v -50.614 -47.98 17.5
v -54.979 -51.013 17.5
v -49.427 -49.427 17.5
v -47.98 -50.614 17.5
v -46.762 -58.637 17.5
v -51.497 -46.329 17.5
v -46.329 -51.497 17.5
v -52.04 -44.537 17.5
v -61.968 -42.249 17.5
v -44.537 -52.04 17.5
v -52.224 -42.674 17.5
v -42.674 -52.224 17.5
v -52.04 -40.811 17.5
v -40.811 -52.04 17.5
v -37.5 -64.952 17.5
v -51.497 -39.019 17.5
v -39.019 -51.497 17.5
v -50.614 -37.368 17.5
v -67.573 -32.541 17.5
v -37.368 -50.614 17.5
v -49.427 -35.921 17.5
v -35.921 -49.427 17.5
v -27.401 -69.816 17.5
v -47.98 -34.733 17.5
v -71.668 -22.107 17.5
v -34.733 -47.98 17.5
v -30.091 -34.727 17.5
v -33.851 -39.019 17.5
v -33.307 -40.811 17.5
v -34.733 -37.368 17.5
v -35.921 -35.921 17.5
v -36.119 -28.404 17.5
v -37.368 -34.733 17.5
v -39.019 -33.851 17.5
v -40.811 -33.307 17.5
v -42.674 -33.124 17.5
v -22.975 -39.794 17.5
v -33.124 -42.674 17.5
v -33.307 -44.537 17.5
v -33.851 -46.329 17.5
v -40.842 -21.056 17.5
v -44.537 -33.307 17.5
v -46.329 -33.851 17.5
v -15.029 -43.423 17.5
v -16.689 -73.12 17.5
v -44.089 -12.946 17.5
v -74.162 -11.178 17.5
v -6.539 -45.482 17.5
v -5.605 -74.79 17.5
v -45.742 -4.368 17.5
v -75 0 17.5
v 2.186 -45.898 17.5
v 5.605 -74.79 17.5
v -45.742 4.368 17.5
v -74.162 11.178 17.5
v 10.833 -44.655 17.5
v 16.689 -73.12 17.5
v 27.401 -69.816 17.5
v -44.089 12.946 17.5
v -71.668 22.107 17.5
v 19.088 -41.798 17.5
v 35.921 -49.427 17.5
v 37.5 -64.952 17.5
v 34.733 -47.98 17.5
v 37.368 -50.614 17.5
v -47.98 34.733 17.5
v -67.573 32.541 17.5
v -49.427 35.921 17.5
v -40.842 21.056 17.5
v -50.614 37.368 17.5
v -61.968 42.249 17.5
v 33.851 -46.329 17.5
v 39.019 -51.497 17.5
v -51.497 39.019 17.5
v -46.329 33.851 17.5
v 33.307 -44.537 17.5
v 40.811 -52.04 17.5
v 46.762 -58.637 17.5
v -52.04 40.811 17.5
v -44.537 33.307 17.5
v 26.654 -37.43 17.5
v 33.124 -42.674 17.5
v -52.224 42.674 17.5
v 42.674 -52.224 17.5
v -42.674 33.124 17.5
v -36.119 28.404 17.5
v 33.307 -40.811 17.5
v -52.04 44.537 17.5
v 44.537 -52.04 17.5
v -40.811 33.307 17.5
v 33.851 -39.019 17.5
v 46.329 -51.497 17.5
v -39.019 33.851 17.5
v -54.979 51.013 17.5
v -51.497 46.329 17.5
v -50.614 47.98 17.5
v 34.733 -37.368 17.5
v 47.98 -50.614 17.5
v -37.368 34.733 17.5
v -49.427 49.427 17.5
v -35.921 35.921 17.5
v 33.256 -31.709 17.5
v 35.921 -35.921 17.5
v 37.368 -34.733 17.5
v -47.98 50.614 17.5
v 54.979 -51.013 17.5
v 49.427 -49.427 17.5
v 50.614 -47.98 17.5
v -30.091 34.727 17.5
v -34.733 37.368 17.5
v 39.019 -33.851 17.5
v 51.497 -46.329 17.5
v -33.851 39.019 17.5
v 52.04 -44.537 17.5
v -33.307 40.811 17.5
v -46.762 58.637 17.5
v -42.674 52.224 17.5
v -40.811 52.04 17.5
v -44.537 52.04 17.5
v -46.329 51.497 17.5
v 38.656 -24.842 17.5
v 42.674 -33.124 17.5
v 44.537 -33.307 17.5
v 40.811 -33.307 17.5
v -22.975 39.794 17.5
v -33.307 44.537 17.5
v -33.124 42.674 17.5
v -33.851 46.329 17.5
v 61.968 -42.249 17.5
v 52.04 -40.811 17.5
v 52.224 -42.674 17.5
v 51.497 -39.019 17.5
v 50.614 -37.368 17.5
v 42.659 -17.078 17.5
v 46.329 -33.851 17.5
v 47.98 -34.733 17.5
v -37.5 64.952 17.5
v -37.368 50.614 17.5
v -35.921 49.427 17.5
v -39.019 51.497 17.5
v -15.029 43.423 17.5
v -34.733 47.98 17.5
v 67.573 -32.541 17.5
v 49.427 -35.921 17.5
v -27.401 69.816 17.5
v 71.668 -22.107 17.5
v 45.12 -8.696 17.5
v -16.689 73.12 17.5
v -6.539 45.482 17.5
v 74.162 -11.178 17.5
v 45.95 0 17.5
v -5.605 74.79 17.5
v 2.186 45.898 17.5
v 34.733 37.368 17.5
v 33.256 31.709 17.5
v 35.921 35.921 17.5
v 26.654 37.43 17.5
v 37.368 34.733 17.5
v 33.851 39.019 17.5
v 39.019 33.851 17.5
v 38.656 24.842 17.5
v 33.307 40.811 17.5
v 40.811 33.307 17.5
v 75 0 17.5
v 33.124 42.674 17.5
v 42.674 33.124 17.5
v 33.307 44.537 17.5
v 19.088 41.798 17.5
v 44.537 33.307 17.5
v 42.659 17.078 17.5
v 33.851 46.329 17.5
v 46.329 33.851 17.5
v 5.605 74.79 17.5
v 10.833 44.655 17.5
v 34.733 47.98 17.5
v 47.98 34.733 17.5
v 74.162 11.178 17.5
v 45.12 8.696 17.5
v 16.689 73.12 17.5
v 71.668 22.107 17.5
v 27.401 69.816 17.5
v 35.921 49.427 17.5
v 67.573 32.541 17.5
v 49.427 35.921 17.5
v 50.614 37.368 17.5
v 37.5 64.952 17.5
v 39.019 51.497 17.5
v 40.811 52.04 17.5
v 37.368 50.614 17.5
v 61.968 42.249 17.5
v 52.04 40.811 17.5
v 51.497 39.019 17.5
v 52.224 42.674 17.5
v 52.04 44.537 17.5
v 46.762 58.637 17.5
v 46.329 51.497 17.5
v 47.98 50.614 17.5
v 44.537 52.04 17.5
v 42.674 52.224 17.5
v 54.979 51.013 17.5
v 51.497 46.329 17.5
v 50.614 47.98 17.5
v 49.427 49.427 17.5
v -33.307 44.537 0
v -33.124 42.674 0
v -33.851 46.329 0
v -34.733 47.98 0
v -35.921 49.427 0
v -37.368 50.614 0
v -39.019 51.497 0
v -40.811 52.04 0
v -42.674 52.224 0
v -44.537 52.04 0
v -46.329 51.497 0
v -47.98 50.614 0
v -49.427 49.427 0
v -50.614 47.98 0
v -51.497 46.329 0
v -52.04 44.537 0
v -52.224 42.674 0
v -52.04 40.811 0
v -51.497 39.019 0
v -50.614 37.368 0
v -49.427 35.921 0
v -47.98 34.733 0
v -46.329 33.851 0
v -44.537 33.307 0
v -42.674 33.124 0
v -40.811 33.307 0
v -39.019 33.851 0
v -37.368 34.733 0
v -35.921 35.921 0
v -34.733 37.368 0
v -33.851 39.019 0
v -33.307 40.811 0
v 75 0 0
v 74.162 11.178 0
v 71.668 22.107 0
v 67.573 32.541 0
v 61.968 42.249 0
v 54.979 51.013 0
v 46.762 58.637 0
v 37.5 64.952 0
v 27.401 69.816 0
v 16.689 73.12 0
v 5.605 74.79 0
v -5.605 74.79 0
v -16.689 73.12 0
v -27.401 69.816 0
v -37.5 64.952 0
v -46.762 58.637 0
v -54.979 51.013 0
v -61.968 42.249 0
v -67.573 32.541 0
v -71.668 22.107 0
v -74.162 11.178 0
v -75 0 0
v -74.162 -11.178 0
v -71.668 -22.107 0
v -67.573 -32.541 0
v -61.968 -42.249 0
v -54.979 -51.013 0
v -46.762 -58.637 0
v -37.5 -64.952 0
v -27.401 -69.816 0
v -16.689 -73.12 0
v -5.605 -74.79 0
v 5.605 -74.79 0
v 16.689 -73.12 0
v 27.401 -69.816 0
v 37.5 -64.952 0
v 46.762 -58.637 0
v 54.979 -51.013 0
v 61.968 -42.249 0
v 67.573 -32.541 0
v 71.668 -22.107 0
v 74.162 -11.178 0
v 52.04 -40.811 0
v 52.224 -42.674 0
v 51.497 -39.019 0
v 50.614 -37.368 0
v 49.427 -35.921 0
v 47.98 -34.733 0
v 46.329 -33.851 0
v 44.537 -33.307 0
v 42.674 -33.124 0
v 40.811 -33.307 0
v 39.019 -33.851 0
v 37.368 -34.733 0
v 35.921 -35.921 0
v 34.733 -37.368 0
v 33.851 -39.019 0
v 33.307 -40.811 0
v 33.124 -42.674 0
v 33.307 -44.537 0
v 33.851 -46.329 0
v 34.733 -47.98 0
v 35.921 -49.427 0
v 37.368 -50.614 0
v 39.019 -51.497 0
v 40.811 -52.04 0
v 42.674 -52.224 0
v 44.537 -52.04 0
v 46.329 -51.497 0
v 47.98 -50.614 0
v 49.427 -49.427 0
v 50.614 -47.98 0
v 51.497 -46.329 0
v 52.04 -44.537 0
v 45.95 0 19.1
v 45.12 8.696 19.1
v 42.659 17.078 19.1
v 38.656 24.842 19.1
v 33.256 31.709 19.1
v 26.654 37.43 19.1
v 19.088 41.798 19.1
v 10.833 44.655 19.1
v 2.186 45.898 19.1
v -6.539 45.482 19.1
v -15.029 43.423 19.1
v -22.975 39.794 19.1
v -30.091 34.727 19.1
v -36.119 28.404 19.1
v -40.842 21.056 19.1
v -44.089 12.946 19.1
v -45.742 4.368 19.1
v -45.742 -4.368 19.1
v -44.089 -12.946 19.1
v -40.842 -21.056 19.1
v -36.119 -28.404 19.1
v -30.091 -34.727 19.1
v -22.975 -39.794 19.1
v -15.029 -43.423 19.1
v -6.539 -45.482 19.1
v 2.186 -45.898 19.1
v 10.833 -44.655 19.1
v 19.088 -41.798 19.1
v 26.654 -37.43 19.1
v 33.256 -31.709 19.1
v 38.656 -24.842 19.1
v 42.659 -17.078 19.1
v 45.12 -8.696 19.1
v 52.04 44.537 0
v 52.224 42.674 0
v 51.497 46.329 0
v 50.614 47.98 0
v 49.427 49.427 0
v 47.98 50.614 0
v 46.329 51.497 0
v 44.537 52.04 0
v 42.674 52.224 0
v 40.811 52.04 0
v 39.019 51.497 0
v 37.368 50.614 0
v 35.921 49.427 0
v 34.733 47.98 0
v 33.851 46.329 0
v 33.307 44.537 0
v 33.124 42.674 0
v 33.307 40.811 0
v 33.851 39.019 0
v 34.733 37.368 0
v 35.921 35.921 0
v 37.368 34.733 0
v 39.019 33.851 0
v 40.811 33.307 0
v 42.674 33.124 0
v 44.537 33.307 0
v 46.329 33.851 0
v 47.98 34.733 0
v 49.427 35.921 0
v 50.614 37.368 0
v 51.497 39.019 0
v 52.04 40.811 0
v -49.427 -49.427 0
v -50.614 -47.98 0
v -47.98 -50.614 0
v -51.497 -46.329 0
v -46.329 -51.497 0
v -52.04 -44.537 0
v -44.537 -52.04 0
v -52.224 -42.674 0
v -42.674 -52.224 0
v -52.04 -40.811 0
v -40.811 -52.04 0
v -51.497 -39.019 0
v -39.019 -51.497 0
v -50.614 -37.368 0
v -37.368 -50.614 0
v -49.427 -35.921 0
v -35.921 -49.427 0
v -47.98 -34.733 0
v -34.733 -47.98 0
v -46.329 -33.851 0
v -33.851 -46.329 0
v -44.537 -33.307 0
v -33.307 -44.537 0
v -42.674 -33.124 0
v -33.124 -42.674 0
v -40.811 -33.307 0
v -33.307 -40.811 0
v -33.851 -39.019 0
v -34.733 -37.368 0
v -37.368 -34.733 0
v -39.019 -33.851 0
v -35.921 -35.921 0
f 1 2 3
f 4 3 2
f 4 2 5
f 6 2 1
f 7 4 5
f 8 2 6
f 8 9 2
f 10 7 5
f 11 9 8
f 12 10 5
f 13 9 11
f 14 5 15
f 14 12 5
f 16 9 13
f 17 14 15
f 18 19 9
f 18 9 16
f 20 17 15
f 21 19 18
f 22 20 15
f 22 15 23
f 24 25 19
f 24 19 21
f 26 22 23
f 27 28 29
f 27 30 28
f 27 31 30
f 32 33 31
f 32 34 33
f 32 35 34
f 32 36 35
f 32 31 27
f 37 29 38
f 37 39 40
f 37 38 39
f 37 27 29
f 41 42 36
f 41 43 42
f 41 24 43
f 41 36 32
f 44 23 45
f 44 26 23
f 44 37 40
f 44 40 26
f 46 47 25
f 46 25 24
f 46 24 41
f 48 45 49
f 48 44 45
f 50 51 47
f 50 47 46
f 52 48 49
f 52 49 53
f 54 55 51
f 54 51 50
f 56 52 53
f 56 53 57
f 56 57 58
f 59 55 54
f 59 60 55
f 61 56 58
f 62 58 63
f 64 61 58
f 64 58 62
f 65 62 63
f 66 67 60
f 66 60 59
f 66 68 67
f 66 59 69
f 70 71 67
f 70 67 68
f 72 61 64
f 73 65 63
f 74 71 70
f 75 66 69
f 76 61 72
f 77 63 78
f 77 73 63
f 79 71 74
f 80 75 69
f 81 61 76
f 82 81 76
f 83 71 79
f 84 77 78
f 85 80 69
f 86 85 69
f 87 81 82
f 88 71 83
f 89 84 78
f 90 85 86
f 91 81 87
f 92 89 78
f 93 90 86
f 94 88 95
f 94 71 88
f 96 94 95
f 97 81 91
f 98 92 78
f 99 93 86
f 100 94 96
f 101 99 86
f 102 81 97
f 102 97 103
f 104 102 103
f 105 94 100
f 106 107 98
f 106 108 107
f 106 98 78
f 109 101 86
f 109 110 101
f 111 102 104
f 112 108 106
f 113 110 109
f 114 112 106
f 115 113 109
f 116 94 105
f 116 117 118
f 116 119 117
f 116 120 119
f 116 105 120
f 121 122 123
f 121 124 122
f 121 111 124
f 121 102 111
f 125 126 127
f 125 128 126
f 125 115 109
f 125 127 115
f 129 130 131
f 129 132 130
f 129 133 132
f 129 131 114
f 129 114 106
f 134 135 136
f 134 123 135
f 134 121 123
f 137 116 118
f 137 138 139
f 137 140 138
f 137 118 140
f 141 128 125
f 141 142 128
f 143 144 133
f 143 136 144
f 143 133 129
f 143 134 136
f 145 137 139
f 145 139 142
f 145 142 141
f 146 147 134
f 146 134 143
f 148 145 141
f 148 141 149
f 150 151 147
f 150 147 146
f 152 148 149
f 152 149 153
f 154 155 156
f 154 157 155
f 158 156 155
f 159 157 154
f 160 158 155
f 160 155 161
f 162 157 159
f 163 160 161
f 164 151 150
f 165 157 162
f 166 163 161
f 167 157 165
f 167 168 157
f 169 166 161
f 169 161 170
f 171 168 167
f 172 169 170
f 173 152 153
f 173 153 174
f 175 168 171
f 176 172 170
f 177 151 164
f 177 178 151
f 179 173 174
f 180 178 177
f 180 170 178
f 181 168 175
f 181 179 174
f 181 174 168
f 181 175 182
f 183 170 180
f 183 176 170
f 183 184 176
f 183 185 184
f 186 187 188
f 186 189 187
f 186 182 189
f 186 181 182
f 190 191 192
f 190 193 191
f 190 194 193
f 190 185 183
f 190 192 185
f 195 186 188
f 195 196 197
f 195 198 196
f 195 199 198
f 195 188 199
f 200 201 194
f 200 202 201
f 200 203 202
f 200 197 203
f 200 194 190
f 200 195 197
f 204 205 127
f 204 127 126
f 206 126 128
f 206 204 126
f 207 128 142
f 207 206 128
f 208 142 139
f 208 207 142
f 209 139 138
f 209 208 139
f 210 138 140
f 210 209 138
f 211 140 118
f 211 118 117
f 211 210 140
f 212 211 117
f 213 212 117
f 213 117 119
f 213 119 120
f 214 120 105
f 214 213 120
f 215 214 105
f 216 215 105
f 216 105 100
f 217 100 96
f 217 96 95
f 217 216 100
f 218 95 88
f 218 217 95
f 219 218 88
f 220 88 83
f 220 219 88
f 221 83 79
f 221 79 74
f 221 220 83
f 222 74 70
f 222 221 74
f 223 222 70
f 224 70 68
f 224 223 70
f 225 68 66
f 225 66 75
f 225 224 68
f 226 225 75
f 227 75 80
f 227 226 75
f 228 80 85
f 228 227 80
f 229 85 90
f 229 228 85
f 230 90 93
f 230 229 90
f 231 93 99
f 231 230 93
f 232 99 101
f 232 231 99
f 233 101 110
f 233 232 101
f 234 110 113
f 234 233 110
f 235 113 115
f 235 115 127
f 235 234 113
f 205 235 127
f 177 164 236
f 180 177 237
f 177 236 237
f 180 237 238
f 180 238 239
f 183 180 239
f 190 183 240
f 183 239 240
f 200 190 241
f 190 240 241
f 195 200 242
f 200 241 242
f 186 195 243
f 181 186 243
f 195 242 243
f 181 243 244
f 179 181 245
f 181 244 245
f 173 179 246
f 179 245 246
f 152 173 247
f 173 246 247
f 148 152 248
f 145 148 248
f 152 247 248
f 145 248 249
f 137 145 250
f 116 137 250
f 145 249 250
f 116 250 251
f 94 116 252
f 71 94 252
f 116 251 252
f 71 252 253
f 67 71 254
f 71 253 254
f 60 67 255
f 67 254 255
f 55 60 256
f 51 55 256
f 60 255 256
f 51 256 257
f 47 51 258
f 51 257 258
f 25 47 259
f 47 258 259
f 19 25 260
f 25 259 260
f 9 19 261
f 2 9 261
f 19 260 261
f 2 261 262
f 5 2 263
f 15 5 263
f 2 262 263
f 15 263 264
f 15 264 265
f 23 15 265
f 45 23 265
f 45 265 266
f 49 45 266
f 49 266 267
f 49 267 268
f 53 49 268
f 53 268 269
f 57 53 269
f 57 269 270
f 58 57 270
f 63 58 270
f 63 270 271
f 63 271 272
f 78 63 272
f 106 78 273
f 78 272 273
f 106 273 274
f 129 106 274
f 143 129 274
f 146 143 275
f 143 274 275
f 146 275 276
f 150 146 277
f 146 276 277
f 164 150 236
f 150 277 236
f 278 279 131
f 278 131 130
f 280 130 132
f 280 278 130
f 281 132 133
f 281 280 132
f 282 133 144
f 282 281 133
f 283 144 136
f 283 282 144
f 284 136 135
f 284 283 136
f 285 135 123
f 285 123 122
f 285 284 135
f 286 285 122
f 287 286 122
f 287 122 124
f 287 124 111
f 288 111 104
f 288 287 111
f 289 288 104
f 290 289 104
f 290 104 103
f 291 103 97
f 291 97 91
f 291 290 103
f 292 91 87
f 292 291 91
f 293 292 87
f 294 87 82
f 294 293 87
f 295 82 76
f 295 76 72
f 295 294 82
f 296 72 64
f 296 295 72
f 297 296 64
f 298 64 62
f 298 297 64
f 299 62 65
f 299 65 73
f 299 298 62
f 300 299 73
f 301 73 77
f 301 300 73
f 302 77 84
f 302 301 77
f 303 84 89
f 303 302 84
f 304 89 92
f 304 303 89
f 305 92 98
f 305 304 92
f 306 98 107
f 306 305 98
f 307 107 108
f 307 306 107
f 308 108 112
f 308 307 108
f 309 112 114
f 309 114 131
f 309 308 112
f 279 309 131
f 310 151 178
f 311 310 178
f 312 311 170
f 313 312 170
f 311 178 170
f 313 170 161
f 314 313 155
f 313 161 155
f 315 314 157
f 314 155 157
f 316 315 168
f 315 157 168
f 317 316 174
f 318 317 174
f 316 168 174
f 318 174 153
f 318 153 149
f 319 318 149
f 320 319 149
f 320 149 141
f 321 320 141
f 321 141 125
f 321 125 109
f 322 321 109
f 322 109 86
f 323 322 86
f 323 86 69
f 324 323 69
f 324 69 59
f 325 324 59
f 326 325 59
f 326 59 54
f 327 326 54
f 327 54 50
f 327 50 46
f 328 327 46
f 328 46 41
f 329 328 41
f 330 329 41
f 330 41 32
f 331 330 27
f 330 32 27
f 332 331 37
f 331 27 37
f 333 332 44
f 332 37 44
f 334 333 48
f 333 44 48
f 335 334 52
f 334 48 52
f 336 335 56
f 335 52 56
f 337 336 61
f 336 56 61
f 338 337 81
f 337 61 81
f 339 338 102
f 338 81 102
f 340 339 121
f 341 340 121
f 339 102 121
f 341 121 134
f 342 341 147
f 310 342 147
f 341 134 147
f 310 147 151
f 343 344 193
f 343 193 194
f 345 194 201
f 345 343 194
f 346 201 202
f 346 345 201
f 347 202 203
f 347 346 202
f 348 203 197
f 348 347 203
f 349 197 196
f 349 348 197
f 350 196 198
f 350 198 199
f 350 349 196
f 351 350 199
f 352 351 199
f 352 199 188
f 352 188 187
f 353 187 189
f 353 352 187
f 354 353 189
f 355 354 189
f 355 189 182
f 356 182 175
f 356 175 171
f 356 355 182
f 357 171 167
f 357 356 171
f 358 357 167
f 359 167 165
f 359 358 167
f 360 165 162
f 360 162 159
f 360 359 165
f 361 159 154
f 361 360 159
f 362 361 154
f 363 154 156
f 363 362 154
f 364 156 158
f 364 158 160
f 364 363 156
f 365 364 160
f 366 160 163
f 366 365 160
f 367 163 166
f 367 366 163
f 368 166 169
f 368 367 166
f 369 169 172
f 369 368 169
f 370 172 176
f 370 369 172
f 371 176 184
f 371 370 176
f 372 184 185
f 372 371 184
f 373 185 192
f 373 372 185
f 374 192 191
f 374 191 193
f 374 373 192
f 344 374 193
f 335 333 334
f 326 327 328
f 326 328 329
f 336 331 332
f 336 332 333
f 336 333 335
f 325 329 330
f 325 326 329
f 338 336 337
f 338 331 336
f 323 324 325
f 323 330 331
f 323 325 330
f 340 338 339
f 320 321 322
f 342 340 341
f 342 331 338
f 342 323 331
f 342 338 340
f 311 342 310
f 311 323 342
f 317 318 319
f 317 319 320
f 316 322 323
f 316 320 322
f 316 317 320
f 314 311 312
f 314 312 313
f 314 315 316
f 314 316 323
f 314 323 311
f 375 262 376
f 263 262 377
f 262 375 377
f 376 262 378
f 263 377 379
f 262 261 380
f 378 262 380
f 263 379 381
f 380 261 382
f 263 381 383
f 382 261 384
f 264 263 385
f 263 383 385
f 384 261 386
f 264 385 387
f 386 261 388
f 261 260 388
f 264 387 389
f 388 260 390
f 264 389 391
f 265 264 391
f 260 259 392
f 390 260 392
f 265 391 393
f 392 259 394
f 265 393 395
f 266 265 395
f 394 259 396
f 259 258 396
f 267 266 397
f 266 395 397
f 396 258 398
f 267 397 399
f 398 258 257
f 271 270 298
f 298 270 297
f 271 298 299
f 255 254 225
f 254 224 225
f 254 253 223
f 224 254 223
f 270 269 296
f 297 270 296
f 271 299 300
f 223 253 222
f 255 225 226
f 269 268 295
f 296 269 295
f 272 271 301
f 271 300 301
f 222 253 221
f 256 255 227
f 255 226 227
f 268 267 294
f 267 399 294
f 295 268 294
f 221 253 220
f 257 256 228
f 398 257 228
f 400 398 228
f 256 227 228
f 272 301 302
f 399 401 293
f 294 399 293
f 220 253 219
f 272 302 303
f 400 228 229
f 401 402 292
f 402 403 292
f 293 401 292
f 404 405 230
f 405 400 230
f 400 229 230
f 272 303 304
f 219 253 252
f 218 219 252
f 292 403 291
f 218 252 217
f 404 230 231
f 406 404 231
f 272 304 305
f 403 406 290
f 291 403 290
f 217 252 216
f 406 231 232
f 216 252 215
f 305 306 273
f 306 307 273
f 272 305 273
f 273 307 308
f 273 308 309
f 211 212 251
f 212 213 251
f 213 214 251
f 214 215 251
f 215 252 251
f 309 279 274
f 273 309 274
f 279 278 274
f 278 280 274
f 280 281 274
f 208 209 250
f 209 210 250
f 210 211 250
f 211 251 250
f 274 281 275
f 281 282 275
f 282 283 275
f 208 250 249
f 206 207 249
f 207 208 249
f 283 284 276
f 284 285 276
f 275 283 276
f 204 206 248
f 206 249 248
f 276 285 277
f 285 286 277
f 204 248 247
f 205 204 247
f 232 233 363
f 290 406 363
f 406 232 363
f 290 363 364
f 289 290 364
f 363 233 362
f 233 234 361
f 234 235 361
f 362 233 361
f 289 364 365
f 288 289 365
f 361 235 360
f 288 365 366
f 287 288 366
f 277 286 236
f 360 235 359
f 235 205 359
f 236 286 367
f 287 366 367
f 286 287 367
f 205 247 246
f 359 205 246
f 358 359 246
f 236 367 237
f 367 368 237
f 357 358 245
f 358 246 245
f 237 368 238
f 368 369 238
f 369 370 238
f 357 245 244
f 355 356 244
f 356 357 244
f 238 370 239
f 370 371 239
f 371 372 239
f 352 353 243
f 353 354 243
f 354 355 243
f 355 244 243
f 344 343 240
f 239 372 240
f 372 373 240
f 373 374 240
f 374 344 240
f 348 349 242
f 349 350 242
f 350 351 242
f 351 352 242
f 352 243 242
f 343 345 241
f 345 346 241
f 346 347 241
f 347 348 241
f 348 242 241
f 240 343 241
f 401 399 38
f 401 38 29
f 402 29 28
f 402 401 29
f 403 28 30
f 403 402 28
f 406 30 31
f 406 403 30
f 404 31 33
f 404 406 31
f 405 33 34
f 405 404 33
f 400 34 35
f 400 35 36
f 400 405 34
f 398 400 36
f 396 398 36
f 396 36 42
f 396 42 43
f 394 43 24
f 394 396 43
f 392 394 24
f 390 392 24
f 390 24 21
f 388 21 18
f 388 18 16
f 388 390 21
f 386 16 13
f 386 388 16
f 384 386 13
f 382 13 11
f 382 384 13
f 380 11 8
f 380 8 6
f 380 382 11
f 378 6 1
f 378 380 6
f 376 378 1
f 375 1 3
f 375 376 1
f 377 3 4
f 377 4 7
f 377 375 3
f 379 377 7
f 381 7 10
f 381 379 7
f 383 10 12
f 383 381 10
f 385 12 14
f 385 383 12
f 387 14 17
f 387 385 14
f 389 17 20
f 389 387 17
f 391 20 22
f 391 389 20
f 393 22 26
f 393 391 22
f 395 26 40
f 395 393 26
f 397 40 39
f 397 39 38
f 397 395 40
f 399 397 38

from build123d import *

# Parameters (mm, degrees)
F2_R     = 75
F2_R_2   = 9.55
F2_R_3   = 45.95
F4_DEPTH = 17.5
F5_DEPTH = 19.1


with BuildPart() as f4:
    # F2 (on Top) → F4 (new body)
    with BuildSketch(Plane.XY):
        Circle(F2_R)
        with Locations((-42.6738942446, -42.6738942446)):
            Circle(F2_R_2, mode=Mode.SUBTRACT)
        with Locations((42.6738942446, -42.6738942446)):
            Circle(F2_R_2, mode=Mode.SUBTRACT)
        with Locations((-42.6738942446, 42.6738942446)):
            Circle(F2_R_2, mode=Mode.SUBTRACT)
        Circle(F2_R_3, mode=Mode.SUBTRACT)
        with Locations((42.6738942446, 42.6738942446)):
            Circle(F2_R_2, mode=Mode.SUBTRACT)
    extrude(amount=F4_DEPTH)

    # F2 (on Top) → F5 (join)
    with BuildSketch(Plane.XY):
        Circle(F2_R_3)
    extrude(amount=F5_DEPTH)


solid = f4.part
